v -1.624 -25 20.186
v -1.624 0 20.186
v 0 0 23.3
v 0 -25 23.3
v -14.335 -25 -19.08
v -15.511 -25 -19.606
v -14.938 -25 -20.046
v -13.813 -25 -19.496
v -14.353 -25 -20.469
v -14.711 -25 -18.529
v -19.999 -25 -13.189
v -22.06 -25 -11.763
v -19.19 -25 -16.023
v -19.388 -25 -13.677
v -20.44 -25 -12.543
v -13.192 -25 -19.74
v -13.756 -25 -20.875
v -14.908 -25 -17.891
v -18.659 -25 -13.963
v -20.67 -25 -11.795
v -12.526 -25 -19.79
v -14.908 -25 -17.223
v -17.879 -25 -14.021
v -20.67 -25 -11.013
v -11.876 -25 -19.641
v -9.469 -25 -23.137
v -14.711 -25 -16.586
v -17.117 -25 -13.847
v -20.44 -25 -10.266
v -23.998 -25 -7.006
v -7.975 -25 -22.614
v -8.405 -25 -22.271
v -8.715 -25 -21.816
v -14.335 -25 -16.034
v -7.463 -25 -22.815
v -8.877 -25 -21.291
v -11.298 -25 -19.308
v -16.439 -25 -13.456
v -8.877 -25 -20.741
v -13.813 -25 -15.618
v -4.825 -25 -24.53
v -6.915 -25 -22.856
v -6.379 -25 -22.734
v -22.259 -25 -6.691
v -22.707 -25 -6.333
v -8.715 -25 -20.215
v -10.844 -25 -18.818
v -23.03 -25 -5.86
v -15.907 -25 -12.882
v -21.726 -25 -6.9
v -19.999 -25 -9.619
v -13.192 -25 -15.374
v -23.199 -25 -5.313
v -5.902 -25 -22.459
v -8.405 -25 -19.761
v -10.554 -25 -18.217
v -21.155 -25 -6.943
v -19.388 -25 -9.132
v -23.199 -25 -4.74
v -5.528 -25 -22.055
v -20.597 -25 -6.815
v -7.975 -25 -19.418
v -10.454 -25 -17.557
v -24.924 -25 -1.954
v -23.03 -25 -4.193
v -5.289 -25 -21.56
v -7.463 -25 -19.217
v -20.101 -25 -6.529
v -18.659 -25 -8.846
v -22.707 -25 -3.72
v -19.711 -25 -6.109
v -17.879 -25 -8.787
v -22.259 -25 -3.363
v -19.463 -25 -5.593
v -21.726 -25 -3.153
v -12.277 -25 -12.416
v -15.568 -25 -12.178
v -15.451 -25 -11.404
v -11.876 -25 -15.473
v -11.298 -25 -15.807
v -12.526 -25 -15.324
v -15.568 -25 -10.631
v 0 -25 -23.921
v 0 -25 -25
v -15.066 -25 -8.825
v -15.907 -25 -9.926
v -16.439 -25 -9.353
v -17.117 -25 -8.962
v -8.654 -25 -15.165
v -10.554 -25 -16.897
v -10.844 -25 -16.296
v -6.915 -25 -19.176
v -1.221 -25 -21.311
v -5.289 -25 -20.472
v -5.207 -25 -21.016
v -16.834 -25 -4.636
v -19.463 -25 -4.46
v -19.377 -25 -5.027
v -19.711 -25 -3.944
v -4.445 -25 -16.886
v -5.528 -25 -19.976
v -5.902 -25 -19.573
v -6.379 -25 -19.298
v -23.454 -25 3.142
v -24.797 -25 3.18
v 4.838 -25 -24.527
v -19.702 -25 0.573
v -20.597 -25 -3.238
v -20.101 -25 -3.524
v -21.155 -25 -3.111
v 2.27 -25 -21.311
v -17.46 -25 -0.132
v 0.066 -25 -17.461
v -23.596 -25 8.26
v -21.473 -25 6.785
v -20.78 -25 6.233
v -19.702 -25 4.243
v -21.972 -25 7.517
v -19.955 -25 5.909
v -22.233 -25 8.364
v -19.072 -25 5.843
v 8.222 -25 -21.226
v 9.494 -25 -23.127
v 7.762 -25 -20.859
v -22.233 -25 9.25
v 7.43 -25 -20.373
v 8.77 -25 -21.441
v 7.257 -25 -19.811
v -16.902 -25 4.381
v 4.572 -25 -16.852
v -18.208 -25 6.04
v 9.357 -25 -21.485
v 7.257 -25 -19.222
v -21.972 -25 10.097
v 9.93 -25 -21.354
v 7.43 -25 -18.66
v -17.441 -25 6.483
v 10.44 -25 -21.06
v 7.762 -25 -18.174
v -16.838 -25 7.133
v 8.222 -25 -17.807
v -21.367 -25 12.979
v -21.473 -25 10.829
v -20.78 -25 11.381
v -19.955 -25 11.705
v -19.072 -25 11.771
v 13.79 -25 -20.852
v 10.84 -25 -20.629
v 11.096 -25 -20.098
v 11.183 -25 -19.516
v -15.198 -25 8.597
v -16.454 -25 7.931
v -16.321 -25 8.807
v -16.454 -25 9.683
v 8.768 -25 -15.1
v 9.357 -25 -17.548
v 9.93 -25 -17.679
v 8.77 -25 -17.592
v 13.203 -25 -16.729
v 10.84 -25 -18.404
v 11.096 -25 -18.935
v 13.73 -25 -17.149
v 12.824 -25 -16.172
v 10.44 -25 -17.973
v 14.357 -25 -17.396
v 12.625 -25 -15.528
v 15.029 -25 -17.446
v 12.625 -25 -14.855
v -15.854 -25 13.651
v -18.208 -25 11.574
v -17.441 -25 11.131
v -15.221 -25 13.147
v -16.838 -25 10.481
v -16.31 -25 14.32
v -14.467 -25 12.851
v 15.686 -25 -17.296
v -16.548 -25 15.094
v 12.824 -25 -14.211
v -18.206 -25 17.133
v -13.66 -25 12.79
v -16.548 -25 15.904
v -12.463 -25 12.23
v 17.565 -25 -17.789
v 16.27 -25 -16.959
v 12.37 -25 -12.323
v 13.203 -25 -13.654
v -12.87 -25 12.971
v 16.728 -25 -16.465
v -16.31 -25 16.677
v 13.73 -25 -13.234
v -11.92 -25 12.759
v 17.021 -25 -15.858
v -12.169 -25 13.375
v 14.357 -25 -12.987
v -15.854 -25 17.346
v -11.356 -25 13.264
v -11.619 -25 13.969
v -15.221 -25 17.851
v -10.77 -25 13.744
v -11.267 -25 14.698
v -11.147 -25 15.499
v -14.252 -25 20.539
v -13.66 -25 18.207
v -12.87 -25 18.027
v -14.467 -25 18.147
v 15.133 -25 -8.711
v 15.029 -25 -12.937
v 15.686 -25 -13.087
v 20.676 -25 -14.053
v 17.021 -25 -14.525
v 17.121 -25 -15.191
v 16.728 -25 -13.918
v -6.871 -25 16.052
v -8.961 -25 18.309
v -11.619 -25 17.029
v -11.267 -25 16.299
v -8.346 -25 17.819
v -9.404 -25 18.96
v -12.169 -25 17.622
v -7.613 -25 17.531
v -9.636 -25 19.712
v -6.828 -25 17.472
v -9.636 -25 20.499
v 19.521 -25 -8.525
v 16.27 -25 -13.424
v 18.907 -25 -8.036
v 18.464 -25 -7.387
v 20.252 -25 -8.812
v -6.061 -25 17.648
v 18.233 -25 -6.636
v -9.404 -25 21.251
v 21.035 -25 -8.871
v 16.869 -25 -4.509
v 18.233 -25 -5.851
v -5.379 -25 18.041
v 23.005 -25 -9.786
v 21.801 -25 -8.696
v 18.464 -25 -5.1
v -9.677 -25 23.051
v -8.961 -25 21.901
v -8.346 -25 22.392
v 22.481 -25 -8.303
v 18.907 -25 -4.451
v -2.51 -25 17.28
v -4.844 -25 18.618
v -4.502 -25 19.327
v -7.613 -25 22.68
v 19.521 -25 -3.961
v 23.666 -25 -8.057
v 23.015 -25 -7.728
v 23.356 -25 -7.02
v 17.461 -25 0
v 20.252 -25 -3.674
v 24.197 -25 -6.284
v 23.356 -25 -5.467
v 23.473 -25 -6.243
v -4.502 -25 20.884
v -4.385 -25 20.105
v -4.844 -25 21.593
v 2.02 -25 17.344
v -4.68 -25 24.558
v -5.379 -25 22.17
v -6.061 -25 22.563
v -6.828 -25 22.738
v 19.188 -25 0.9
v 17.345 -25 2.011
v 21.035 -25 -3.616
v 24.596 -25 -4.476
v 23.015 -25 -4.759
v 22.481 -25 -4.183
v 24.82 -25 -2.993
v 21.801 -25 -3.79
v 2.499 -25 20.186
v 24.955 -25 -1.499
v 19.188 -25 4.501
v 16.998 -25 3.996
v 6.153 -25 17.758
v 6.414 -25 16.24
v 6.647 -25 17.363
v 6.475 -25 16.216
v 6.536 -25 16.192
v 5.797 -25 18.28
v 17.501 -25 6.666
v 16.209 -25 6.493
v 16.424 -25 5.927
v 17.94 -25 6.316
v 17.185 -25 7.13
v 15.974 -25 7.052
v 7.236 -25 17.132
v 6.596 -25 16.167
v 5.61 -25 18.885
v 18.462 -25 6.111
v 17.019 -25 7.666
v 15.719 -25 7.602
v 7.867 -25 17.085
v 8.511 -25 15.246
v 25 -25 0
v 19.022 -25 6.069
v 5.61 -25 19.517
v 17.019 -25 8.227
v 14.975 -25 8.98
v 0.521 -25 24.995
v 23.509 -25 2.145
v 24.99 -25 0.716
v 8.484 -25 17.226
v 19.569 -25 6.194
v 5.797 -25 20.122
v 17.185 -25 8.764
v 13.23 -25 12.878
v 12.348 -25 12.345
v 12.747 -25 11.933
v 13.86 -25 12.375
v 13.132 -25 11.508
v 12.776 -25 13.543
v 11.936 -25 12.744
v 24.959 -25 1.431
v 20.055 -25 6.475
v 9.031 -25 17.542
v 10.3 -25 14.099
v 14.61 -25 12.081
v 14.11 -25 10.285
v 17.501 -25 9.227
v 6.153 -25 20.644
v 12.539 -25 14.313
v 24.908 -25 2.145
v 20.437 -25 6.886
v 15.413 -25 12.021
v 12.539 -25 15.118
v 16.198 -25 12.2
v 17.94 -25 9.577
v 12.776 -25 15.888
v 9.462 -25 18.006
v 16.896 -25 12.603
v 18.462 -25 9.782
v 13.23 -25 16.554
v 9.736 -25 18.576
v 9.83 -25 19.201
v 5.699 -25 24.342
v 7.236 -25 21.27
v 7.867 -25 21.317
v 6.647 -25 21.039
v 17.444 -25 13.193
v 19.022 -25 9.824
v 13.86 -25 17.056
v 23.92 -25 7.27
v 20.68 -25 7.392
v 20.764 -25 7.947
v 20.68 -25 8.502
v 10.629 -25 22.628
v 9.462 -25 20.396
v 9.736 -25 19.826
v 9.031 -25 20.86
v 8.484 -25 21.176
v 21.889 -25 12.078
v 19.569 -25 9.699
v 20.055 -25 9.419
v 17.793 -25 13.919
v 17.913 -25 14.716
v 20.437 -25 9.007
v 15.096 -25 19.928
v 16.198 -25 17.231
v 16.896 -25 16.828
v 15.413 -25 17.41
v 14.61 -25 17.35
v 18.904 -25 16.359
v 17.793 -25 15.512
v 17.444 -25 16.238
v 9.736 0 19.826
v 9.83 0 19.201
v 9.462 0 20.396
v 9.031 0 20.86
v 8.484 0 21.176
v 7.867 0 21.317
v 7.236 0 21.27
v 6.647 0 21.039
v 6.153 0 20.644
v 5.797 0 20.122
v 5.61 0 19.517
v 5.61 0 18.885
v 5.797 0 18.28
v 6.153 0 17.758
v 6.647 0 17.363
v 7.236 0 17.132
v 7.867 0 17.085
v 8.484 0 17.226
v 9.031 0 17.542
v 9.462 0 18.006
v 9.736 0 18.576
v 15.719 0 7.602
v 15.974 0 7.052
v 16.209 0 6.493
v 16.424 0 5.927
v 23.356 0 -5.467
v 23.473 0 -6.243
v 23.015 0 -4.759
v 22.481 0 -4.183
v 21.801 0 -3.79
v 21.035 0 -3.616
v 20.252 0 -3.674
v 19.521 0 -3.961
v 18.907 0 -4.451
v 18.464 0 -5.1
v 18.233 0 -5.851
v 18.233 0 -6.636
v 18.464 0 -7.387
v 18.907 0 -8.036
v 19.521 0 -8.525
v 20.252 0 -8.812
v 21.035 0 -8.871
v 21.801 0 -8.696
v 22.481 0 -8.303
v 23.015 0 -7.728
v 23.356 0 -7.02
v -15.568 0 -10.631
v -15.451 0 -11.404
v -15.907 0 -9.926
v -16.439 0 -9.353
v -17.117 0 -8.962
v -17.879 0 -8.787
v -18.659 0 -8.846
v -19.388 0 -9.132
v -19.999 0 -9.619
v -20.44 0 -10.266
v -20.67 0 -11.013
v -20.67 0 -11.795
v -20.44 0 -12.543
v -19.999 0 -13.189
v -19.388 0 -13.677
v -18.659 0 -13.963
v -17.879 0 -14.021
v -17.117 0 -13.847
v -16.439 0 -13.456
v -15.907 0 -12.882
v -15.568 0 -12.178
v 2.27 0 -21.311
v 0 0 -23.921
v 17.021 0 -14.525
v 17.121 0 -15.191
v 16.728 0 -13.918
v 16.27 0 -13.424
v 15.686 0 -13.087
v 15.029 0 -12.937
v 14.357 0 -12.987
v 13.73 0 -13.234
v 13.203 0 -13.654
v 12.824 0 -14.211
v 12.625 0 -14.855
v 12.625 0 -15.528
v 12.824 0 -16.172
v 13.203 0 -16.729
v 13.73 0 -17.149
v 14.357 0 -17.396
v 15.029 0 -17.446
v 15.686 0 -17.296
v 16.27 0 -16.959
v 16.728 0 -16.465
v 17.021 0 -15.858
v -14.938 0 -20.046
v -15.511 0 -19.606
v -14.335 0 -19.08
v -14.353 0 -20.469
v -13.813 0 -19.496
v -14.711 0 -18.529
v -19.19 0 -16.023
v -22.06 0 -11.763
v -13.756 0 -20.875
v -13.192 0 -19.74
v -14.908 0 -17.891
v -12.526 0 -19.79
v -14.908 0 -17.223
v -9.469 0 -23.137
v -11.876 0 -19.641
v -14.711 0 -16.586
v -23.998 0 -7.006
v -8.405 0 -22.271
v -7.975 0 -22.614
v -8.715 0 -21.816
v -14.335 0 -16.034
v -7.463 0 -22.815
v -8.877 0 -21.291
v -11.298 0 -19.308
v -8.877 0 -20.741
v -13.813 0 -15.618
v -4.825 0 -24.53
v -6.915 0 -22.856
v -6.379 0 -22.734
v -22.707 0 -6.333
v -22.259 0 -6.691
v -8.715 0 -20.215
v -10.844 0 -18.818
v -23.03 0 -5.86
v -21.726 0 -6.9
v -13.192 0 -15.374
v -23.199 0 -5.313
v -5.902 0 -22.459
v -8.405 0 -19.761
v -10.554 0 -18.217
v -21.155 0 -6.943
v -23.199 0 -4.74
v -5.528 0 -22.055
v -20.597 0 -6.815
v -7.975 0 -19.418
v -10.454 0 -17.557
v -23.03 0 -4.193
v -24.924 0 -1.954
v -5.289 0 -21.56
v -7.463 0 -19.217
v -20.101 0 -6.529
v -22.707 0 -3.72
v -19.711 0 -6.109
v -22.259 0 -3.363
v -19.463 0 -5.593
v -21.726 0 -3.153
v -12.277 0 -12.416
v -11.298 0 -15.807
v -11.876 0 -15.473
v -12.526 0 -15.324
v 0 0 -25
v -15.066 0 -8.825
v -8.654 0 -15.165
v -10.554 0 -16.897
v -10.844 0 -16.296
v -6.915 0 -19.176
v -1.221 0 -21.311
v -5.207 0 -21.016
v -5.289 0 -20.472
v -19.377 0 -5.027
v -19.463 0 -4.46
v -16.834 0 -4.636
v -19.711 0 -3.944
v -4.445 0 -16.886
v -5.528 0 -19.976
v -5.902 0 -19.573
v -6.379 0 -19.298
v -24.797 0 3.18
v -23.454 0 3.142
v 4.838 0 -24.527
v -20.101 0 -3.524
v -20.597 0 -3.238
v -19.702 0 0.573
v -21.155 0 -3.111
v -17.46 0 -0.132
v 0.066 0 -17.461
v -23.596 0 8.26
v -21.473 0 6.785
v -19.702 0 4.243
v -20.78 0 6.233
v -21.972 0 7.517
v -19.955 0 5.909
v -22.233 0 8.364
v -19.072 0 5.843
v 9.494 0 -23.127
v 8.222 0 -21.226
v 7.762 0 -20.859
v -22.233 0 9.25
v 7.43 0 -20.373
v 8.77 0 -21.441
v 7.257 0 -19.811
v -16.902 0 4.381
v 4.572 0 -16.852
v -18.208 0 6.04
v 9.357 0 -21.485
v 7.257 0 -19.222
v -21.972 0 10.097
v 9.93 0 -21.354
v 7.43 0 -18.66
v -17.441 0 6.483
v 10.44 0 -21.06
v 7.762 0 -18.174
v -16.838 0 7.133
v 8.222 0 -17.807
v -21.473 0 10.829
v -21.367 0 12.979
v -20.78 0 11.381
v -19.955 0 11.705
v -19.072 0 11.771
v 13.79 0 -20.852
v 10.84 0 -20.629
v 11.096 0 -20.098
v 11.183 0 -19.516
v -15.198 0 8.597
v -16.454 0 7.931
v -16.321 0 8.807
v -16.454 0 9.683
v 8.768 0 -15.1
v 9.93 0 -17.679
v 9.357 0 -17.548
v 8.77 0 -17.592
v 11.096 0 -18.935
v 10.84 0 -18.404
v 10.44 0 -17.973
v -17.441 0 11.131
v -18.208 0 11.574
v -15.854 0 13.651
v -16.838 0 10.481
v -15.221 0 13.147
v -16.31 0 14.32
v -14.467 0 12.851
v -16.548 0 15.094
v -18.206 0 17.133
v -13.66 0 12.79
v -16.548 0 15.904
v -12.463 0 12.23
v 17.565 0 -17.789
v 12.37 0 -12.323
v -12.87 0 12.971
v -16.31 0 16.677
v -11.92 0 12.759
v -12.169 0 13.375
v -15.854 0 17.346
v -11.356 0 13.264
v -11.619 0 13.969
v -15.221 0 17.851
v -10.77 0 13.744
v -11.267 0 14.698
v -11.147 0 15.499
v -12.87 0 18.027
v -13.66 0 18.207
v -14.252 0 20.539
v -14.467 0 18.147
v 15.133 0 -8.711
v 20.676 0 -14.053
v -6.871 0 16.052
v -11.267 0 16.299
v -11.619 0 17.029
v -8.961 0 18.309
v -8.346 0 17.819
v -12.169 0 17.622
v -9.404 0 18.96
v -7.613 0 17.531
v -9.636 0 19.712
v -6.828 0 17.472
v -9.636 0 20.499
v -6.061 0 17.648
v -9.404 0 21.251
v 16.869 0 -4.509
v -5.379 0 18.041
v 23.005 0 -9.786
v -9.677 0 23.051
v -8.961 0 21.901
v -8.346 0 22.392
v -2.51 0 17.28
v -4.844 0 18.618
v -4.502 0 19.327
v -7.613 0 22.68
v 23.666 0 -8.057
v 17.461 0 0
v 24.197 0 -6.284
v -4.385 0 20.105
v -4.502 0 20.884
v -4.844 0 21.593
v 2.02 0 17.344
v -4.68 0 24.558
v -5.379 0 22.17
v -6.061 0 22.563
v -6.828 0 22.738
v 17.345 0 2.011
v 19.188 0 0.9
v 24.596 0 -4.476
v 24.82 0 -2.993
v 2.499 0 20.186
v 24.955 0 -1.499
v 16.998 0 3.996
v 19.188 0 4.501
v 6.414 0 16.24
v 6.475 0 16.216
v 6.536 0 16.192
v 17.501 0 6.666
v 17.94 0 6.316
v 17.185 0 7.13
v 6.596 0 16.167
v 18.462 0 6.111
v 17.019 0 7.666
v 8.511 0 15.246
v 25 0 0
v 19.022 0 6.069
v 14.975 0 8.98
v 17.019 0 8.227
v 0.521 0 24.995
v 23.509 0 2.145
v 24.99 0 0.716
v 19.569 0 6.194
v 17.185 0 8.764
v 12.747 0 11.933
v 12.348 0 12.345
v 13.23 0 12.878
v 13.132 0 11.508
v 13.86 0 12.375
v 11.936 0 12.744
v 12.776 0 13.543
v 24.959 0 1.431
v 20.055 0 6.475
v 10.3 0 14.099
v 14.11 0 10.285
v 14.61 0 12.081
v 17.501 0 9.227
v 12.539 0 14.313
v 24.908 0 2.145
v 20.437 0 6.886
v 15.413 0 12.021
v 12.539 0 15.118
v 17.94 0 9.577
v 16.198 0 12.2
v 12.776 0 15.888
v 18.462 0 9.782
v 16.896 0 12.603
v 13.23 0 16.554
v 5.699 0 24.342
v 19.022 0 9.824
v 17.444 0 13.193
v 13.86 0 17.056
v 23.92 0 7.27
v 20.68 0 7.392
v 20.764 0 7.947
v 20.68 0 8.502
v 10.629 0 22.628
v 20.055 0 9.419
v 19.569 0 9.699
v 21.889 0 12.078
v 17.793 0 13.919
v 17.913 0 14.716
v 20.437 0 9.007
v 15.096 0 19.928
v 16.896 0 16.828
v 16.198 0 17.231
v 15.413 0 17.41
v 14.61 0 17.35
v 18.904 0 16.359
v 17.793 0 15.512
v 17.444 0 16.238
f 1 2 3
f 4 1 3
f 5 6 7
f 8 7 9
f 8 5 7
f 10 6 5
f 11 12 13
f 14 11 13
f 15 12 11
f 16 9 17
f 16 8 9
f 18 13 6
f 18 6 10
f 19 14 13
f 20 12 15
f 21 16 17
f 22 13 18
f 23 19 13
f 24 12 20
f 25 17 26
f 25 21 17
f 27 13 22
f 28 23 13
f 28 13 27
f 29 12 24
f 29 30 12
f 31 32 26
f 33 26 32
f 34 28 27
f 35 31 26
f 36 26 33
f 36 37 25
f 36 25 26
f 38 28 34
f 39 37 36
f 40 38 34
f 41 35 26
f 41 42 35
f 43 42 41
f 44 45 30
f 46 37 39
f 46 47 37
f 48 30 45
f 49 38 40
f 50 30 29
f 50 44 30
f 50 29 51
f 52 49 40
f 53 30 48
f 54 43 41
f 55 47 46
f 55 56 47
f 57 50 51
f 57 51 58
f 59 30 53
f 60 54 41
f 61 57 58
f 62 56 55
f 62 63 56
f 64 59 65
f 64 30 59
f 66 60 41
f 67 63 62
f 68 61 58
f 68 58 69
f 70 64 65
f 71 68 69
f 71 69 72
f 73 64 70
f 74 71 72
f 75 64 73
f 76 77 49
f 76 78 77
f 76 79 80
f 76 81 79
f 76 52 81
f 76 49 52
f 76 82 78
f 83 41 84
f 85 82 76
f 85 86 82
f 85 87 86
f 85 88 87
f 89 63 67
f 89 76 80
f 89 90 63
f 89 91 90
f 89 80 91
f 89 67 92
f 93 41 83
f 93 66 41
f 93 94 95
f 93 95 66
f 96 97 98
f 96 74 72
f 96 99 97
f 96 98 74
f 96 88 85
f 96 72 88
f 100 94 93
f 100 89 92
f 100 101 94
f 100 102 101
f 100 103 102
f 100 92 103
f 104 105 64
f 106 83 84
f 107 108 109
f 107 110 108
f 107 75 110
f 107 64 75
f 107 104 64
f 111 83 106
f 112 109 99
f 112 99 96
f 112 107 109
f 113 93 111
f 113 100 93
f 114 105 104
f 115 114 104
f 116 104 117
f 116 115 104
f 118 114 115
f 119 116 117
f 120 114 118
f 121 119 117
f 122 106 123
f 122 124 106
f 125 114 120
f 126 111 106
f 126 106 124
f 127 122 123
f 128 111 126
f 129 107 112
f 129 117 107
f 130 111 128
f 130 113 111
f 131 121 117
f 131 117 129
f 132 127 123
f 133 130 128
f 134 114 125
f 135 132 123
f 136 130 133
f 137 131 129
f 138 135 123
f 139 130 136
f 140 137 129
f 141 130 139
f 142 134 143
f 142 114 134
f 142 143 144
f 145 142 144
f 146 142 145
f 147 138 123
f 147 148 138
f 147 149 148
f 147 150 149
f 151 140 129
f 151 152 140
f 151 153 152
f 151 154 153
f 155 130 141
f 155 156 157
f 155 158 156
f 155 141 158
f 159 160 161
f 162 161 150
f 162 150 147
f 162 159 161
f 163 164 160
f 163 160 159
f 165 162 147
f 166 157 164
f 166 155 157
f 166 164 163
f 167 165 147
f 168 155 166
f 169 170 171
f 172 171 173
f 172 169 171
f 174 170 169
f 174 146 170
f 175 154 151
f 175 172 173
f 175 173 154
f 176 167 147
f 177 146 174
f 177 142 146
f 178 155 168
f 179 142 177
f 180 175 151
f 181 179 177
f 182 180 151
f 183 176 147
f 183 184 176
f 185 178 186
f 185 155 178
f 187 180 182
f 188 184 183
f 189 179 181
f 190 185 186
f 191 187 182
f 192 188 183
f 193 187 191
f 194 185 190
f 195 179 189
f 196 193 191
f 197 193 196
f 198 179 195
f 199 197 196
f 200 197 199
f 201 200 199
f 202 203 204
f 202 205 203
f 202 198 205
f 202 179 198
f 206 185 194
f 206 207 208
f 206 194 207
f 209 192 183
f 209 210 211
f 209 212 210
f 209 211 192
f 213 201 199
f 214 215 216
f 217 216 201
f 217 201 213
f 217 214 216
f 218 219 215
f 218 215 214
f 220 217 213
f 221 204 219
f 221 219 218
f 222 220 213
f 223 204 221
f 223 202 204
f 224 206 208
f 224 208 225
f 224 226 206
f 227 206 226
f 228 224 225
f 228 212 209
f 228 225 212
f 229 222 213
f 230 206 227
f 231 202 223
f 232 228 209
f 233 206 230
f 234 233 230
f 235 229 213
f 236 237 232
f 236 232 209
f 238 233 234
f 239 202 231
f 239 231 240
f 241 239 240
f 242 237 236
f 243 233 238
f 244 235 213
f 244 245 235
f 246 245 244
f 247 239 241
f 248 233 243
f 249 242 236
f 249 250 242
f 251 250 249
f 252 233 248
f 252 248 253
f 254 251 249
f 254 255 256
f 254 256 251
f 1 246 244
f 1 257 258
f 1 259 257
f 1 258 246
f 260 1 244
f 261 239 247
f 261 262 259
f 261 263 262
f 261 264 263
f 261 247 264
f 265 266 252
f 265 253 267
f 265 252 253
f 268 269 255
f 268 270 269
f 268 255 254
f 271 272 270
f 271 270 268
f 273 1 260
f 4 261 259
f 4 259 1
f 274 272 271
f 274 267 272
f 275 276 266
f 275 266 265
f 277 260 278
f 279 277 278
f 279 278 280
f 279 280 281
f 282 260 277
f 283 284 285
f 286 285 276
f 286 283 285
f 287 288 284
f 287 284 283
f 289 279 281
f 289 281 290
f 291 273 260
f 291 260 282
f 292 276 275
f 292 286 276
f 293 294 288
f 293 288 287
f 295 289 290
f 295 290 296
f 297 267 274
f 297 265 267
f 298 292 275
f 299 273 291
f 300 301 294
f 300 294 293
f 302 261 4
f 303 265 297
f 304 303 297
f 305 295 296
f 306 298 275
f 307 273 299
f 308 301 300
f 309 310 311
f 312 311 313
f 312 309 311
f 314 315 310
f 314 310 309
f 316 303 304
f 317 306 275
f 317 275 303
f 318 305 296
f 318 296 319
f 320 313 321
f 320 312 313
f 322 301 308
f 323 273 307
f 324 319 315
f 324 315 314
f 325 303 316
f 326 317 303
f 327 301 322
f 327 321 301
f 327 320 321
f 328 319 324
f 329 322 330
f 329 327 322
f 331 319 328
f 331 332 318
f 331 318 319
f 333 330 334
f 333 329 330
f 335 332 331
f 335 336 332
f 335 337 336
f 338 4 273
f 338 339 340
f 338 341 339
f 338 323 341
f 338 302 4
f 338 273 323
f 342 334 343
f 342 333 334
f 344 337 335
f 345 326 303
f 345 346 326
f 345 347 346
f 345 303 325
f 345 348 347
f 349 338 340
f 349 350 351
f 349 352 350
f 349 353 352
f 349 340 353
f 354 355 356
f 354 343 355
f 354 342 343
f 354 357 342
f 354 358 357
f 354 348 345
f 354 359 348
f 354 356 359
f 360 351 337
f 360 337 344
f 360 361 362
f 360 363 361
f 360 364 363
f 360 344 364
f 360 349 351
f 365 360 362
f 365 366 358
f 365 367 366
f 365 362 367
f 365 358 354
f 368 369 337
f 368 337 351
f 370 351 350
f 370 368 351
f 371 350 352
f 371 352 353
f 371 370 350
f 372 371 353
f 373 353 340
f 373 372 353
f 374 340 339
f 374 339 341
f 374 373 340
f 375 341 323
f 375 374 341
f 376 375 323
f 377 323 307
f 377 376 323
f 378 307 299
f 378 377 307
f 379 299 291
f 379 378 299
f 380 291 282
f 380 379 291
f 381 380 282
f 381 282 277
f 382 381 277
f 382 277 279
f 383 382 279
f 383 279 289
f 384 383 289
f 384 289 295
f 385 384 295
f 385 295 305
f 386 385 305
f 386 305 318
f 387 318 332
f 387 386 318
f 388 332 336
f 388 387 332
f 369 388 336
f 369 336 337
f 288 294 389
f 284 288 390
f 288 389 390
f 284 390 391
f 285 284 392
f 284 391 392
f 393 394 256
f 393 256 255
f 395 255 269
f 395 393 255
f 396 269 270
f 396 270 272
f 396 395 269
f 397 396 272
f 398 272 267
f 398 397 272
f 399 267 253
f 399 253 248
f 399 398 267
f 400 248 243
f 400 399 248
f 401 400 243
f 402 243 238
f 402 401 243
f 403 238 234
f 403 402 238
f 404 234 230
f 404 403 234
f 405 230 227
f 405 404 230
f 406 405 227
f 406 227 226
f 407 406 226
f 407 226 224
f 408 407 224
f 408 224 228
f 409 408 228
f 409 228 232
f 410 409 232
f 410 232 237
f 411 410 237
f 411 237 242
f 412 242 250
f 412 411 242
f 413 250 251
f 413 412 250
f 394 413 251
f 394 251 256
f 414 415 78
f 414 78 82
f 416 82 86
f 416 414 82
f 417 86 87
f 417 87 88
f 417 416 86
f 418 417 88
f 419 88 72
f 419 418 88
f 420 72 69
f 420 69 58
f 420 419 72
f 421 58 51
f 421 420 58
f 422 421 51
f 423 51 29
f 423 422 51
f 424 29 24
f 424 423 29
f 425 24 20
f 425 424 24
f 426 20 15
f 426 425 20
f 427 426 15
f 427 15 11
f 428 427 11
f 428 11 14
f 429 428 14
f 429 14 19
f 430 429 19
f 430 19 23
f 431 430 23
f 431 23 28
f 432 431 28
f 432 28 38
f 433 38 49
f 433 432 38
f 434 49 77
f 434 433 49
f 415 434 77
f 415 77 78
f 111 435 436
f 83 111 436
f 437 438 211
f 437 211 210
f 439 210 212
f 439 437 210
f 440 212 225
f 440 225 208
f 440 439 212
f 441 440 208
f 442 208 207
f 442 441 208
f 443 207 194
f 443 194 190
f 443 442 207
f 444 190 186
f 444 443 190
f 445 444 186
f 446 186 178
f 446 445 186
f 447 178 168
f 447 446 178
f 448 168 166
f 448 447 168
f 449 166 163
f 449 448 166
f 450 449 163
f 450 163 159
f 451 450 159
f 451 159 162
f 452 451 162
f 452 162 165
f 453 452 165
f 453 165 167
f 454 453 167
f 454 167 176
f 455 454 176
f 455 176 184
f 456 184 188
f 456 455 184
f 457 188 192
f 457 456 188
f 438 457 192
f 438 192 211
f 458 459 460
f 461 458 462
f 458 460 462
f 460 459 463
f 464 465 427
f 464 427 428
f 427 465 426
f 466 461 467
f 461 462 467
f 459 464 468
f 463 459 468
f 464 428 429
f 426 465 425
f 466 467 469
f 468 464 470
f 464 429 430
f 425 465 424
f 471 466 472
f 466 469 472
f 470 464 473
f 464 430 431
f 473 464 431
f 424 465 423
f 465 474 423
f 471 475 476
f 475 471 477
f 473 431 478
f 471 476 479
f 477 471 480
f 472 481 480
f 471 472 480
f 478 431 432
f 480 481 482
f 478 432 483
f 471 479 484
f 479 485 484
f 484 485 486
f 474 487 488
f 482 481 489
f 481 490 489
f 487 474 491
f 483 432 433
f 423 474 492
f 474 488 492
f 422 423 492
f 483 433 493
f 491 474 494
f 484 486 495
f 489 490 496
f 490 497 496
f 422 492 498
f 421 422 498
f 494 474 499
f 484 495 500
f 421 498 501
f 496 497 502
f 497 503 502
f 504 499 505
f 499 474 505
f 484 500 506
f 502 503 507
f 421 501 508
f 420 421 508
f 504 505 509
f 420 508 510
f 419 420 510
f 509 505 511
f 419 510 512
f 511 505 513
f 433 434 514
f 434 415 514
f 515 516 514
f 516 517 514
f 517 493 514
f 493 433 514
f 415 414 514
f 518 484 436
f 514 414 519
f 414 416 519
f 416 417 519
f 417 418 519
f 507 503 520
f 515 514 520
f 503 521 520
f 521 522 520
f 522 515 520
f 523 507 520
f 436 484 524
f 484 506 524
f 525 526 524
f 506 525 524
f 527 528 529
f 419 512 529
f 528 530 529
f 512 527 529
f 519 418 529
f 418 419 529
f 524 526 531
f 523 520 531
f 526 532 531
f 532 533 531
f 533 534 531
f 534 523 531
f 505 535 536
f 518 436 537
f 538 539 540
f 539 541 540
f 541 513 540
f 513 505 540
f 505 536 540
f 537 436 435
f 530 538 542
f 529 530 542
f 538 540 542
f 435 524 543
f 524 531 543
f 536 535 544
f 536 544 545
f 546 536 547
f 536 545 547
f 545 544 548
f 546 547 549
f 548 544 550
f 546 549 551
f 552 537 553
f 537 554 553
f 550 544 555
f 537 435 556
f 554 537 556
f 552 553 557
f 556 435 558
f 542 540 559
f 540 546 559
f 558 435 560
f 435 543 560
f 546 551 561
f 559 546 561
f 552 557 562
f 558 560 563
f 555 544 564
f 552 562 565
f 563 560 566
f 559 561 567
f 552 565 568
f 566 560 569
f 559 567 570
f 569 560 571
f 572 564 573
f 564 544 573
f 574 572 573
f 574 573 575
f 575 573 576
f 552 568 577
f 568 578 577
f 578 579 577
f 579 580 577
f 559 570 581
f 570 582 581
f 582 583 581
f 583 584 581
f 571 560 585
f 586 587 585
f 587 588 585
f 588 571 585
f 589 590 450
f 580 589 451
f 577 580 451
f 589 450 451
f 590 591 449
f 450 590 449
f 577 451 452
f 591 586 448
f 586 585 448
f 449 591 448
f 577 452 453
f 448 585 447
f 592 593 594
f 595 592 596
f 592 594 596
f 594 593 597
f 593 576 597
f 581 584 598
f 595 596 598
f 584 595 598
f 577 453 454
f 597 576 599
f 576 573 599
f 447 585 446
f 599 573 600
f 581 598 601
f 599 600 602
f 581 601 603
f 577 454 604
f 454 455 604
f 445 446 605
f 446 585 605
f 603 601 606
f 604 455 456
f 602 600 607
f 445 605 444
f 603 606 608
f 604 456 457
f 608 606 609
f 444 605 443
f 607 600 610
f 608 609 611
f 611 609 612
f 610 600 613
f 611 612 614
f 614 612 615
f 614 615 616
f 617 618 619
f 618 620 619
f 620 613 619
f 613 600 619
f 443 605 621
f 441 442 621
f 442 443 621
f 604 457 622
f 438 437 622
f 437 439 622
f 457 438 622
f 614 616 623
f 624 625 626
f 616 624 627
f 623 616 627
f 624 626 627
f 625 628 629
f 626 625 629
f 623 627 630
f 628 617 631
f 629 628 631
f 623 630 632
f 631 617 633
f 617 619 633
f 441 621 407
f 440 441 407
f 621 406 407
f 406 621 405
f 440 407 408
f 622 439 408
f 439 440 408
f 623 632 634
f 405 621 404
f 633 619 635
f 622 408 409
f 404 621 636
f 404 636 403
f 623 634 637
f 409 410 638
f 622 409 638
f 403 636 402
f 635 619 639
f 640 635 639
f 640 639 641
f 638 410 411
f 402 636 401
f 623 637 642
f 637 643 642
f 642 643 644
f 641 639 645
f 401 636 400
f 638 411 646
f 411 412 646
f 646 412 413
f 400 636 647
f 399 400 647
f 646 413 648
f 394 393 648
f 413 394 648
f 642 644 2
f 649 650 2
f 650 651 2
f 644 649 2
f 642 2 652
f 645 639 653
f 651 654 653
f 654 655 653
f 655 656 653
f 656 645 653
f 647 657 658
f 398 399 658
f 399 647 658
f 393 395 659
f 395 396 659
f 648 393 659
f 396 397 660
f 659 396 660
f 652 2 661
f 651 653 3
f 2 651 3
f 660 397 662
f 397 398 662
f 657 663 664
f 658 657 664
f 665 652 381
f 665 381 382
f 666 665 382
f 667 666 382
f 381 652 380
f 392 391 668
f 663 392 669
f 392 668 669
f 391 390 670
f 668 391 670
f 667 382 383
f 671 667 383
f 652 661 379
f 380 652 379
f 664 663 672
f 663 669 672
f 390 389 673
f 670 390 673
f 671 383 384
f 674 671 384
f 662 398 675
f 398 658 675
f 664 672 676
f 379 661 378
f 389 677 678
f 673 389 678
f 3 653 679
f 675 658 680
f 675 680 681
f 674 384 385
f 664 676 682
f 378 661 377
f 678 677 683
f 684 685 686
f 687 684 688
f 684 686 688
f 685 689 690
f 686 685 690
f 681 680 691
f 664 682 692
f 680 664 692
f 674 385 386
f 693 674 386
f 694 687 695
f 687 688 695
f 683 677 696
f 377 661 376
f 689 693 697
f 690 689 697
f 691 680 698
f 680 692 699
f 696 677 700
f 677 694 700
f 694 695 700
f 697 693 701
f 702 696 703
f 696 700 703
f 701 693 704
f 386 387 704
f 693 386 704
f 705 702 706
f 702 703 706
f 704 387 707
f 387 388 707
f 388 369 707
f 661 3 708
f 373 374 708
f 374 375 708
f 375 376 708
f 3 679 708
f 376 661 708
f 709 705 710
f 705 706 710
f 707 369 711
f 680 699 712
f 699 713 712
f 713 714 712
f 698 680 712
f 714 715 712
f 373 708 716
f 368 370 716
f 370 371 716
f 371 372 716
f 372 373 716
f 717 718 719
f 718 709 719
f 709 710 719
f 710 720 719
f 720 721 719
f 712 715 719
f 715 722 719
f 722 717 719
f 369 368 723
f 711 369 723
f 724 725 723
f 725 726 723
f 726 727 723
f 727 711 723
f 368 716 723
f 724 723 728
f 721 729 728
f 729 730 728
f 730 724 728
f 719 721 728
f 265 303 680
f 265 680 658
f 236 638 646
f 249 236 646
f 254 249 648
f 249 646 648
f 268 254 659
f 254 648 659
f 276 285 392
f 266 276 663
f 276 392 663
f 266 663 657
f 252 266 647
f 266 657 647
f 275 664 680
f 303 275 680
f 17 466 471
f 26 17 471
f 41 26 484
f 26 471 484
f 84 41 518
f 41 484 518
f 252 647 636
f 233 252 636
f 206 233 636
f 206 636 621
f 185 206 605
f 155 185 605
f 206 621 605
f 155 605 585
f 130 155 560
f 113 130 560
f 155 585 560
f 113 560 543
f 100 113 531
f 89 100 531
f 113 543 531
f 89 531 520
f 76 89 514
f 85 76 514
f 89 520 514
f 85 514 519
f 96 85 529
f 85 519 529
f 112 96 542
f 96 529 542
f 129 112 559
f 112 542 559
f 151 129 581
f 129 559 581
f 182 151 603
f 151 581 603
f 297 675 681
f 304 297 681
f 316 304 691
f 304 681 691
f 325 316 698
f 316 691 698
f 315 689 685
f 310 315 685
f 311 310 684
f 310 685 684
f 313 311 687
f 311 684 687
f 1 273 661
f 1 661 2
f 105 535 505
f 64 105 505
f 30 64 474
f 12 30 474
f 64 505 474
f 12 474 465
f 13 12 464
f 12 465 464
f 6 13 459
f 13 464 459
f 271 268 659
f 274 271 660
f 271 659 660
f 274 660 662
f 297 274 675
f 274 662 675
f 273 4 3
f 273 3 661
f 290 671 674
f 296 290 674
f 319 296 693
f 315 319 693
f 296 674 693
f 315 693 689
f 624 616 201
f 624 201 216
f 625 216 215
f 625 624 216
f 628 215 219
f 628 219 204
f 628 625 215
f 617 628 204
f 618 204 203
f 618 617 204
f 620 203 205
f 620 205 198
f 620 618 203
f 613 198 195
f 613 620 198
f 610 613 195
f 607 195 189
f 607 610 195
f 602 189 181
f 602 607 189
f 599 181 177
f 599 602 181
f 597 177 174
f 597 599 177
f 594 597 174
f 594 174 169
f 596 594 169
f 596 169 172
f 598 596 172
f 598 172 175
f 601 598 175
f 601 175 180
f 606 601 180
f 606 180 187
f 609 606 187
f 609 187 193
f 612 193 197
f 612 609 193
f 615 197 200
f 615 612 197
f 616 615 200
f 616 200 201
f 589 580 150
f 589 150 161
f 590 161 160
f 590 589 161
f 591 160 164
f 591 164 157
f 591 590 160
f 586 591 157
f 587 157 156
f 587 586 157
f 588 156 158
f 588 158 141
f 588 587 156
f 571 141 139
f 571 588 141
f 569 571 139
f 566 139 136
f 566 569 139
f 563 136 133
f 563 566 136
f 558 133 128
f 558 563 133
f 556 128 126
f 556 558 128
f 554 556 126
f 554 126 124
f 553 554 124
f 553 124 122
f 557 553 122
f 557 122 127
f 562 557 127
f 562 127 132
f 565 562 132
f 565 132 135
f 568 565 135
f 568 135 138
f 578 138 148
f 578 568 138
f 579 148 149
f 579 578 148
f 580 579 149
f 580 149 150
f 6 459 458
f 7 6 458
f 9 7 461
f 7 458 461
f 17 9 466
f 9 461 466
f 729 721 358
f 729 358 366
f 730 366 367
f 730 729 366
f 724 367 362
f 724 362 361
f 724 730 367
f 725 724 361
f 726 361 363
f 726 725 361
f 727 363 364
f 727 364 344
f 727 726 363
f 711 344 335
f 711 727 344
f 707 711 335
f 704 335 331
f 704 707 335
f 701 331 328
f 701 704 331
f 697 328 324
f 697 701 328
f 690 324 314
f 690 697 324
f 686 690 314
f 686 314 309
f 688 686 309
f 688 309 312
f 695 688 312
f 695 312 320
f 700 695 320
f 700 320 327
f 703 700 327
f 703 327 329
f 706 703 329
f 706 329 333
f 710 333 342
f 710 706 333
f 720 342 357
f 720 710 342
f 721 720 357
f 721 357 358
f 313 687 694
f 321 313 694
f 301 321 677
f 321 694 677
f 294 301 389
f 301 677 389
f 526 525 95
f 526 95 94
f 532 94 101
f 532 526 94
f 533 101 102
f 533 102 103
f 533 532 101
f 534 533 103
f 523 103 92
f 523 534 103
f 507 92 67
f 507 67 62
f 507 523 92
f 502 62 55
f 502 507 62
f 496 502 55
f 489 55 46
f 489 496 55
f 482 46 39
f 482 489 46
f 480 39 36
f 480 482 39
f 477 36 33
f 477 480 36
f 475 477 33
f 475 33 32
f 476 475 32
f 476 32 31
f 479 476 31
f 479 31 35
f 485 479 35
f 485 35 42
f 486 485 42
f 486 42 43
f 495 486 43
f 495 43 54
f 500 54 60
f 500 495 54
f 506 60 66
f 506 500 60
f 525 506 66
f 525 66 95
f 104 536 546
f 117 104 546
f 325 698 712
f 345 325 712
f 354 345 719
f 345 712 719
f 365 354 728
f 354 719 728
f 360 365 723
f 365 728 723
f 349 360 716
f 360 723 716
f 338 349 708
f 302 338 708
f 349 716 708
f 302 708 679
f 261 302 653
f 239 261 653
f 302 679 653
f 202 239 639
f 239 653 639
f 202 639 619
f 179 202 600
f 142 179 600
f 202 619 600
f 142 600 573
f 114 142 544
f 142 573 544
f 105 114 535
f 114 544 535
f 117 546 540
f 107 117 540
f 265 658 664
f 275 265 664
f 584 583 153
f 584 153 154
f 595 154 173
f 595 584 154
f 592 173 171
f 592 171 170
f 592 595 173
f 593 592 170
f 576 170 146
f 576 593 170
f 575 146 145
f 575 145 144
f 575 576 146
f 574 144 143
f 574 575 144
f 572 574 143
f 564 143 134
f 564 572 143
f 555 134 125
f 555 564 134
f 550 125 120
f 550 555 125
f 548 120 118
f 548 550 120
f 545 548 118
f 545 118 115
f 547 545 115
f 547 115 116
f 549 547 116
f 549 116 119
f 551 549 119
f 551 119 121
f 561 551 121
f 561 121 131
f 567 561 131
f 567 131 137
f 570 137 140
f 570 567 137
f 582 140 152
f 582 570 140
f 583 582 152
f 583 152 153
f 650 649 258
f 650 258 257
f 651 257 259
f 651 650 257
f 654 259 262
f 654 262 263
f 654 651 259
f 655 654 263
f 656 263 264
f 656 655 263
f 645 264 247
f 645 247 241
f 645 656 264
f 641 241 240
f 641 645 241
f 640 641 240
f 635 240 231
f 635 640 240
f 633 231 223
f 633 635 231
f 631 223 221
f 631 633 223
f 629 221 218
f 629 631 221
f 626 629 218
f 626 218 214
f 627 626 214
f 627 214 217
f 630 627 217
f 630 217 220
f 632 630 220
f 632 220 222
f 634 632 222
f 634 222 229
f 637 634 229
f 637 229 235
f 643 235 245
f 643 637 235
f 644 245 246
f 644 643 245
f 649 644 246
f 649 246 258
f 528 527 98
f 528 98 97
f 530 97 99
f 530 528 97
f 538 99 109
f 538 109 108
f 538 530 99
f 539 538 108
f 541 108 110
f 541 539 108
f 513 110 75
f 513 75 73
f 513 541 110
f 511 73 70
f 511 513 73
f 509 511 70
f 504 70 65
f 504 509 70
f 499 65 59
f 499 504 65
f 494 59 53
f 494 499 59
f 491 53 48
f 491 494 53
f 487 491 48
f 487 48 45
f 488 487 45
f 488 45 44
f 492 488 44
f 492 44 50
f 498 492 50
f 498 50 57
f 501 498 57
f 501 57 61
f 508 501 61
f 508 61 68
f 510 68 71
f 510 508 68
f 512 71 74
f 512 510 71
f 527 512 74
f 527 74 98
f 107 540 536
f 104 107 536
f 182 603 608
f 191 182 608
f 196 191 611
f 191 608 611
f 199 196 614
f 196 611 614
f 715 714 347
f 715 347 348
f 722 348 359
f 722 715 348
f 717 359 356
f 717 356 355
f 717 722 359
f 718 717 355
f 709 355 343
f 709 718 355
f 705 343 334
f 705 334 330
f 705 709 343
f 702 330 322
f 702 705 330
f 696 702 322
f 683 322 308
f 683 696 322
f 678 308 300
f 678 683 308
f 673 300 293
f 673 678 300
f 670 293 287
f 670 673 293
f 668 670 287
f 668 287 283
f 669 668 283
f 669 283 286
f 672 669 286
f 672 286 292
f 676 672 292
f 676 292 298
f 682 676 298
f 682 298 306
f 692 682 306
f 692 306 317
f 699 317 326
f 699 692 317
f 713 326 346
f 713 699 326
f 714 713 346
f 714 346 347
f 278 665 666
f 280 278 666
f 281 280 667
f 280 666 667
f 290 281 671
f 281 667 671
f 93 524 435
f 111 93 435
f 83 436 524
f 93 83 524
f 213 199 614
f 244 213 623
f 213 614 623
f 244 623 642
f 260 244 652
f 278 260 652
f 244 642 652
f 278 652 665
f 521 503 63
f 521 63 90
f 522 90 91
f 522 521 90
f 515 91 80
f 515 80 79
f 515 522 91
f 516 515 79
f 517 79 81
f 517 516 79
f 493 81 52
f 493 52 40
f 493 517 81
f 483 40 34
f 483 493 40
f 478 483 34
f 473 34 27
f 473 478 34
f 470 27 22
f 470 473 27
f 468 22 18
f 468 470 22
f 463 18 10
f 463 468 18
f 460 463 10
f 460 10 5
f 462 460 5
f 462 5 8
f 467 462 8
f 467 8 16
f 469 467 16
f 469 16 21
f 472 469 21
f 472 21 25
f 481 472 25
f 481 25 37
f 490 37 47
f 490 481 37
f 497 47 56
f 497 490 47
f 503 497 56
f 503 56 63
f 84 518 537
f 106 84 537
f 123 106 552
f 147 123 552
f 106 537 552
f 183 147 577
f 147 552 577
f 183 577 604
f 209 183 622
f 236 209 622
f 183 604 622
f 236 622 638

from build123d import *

# Parameters (mm, degrees)
F0_R     = 2.8256485239
F0_R_2   = 3.5765465122
F0_R_3   = 2.7439429232
F0_R_4   = 3.3466336439
F0_R_5   = 3.4276298102
F0_R_6   = 3.6294104123
F0_R_7   = 2.635041669
F0_R_8   = 2.702327646
F0_R_9   = 2.972249944
F0_R_10  = 2.6404432644
F0_R_11  = 2.6241403427
F0_R_12  = 2.7159497561
F0_R_13  = 2.2390207397
F0_R_14  = 2.2607819858
F0_R_15  = 1.9741758504
F0_R_16  = 2.1219308593
F0_R_17  = 1.8827842167
F0_R_18  = 1.845321618
F0_R_19  = 1.9213841029
F1_DEPTH = 25


with BuildPart() as f1:
    # F0 (on Front) → F1 (new body)
    with BuildSketch(Plane.XZ):
        with BuildLine():
            ThreePointArc((24.5960952758, -4.4757230907), (24.8988190673, -2.2469555075), (25, 0))
            ThreePointArc((25, 0), (24.9769503507, 1.073289886), (24.9078439057, 2.1446006555))
            ThreePointArc((24.9078439057, 2.1446006555), (0.5208838947, 24.9945730103), (-24.7968706797, 3.1804409279))
            ThreePointArc((-24.7968706797, 3.1804409279), (-23.1514874221, -9.4344385176), (-15.5110739298, -19.6062894384))
            ThreePointArc((-15.5110739298, -19.6062894384), (-13.7709472228, -14.2438804489), (-9.2095510788, -17.5570566207))
            ThreePointArc((-9.2095510788, -17.5570566207), (-10.6398306506, -20.3713740635), (-13.7563172666, -20.8749547368))
            ThreePointArc((-13.7563172666, -20.8749547368), (-7.1807427047, -23.9465432622), (0, -25))
            ThreePointArc((0, -25), (13.7903970721, -20.8524566561), (23.0050925772, -9.7859958876))
            ThreePointArc((23.0050925772, -9.7859958876), (16.860220208, -5.0514647504), (24.5960952758, -4.4757230907))
        make_face()
        with Locations((-7.0527321659, -21.0157949477)):
            Circle(F0_R, mode=Mode.SUBTRACT)
        with Locations((-18.0755164474, -11.404263787)):
            Circle(F0_R_2, mode=Mode.SUBTRACT)
        with Locations((-21.2986432016, -5.0265877508)):
            Circle(F0_R_3, mode=Mode.SUBTRACT)
        Polygon((4.266737029, -20.0934484601), (0, -25), (-2.6190390345, -20.0934484601), align=None, mode=Mode.SUBTRACT)
        with Locations((9.209163487, -19.5164699107)):
            Circle(F0_R_4, mode=Mode.SUBTRACT)
        with Locations((14.8604605347, -15.1914991438)):
            Circle(F0_R_5, mode=Mode.SUBTRACT)
        with BuildLine():
            Line((-18.9121421427, -0.7938772906), (-24.7968706797, 3.1804409279))
            Line((-24.7968706797, 3.1804409279), (-19.3468905014, 5.0684465431))
            ThreePointArc((-19.3468905014, 5.0684465431), (-21.9186154294, 11.469459375), (-15.5548330751, 8.8069401681))
            ThreePointArc((-15.5548330751, 8.8069401681), (-16.5182971087, 6.3016908172), (-18.9121421427, 5.0875890061))
            Line((-18.9121421427, 5.0875890061), (-18.9121421427, -0.7938772906))
        make_face(mode=Mode.SUBTRACT)
        with Locations((-7.0253848098, 20.105432719)):
            Circle(F0_R_6, mode=Mode.SUBTRACT)
        with BuildLine():
            Line((19.5046194307, 4.8279847044), (24.9078439057, 2.1446006555))
            Line((24.9078439057, 2.1446006555), (18.717167899, 0))
            Line((18.717167899, 0), (18.717167899, 4.7704775792))
            ThreePointArc((18.717167899, 4.7704775792), (17.4488389654, 5.1069570809), (16.4242905584, 5.9268212774))
            ThreePointArc((16.4242905584, 5.9268212774), (17.1998275024, 3.0083990244), (17.4609430101, 0))
            ThreePointArc((17.4609430101, 0), (-6.6059492578, -16.1631050607), (-12.4625227562, 12.2298837833))
            ThreePointArc((-12.4625227562, 12.2298837833), (-16.8312529103, 17.4566617233), (-10.3065616702, 15.4987508431))
            ThreePointArc((-10.3065616702, 15.4987508431), (-10.4242678564, 14.5913936768), (-10.7695943307, 13.7441030538))
            ThreePointArc((-10.7695943307, 13.7441030538), (-2.5101792072, 17.2795697617), (6.4137999623, 16.2403109836))
            ThreePointArc((6.4137999623, 16.2403109836), (5.9393579148, 21.9051948536), (10.9397131516, 19.2010402679))
            ThreePointArc((10.9397131516, 19.2010402679), (9.558784183, 16.551960716), (6.5962795119, 16.1670537638))
            ThreePointArc((6.5962795119, 16.1670537638), (9.4231129686, 14.6999820674), (11.9364463054, 12.7438526513))
            ThreePointArc((11.9364463054, 12.7438526513), (14.1879258767, 18.3986934482), (19.0337079573, 14.7156538442))
            ThreePointArc((19.0337079573, 14.7156538442), (17.0365778867, 11.3571292026), (13.1320353046, 11.5080050208))
            ThreePointArc((13.1320353046, 11.5080050208), (14.5572332623, 9.6421725015), (15.7192265164, 7.6020029287))
            ThreePointArc((15.7192265164, 7.6020029287), (18.7083751896, 11.1226574982), (22.0615752041, 7.9468004405))
            ThreePointArc((22.0615752041, 7.9468004405), (21.3406257649, 5.9303038237), (19.5046194307, 4.8279847044))
        make_face(mode=Mode.SUBTRACT)
        Polygon((3.975788597, 19.6694843471), (-2.6190390345, 19.6694843471), (0, 24.2276750505), align=None, mode=Mode.SUBTRACT)
        with BuildLine():
            ThreePointArc((23.0050925772, -9.7859958876), (23.9482362722, -7.1750943862), (24.5960952758, -4.4757230907))
            ThreePointArc((24.5960952758, -4.4757230907), (16.860220208, -5.0514647504), (23.0050925772, -9.7859958876))
        make_face()
        with Locations((20.8382867277, -6.2433271669)):
            Circle(F0_R_7, mode=Mode.SUBTRACT)
        with BuildLine():
            ThreePointArc((11.9364463054, 12.7438526513), (12.5494630323, 12.1406551883), (13.1320353046, 11.5080050208))
            ThreePointArc((13.1320353046, 11.5080050208), (17.0365778867, 11.3571292026), (19.0337079573, 14.7156538442))
            ThreePointArc((19.0337079573, 14.7156538442), (14.1879258767, 18.3986934482), (11.9364463054, 12.7438526513))
        make_face()
        with Locations((15.2111686766, 14.7156538442)):
            Circle(F0_R_8, mode=Mode.SUBTRACT)
        with BuildLine():
            ThreePointArc((-15.5548330751, 8.8069401681), (-21.9186154294, 11.469459375), (-19.3468905014, 5.0684465431))
            Line((-19.3468905014, 5.0684465431), (-18.9121421427, 5.2190539427))
            Line((-18.9121421427, 5.2190539427), (-18.9121421427, 5.0875890061))
            ThreePointArc((-18.9121421427, 5.0875890061), (-16.5182971087, 6.3016908172), (-15.5548330751, 8.8069401681))
        make_face()
        with Locations((-19.2937050015, 8.8069401681)):
            Circle(F0_R_9, mode=Mode.SUBTRACT)
        with Locations((-7.0253848098, 20.105432719)):
            Circle(F0_R_6)
        with Locations((-7.0253848098, 20.105432719)):
            Circle(F0_R_10, mode=Mode.SUBTRACT)
        with Locations((-18.0755164474, -11.404263787)):
            Circle(F0_R_2)
        with Locations((-18.0755164474, -11.404263787)):
            Circle(F0_R_11, mode=Mode.SUBTRACT)
        with BuildLine():
            ThreePointArc((-10.3065616702, 15.4987508431), (-16.8312529103, 17.4566617233), (-12.4625227562, 12.2298837833))
            ThreePointArc((-12.4625227562, 12.2298837833), (-11.6407057812, 13.0145495395), (-10.7695943307, 13.7441030538))
            ThreePointArc((-10.7695943307, 13.7441030538), (-10.4242678564, 14.5913936768), (-10.3065616702, 15.4987508431))
        make_face()
        with Locations((-13.8626694679, 15.4987508431)):
            Circle(F0_R_12, mode=Mode.SUBTRACT)
        with BuildLine():
            ThreePointArc((-9.2095510788, -17.5570566207), (-13.7709472228, -14.2438804489), (-15.5110739298, -19.6062894384))
            ThreePointArc((-15.5110739298, -19.6062894384), (-14.6474374814, -20.2596291977), (-13.7563172666, -20.8749547368))
            ThreePointArc((-13.7563172666, -20.8749547368), (-10.6398306506, -20.3713740635), (-9.2095510788, -17.5570566207))
        make_face()
        with Locations((-12.6935141161, -17.5570566207)):
            Circle(F0_R_13, mode=Mode.SUBTRACT)
        with Locations((14.8604605347, -15.1914991438)):
            Circle(F0_R_5)
        with Locations((14.8604605347, -15.1914991438)):
            Circle(F0_R_14, mode=Mode.SUBTRACT)
        with Locations((9.209163487, -19.5164699107)):
            Circle(F0_R_4)
        with Locations((9.209163487, -19.5164699107)):
            Circle(F0_R_15, mode=Mode.SUBTRACT)
        with BuildLine():
            ThreePointArc((6.4137999623, 16.2403109836), (6.5051428606, 16.2039392484), (6.5962795119, 16.1670537638))
            ThreePointArc((6.5962795119, 16.1670537638), (9.558784183, 16.551960716), (10.9397131516, 19.2010402679))
            ThreePointArc((10.9397131516, 19.2010402679), (5.9393579148, 21.9051948536), (6.4137999623, 16.2403109836))
        make_face()
        with Locations((7.7083422802, 19.2010402679)):
            Circle(F0_R_16, mode=Mode.SUBTRACT)
        with BuildLine():
            Line((18.717167899, 5.2190539427), (19.5046194307, 4.8279847044))
            ThreePointArc((19.5046194307, 4.8279847044), (21.3406257649, 5.9303038237), (22.0615752041, 7.9468004405))
            ThreePointArc((22.0615752041, 7.9468004405), (18.7083751896, 11.1226574982), (15.7192265164, 7.6020029287))
            ThreePointArc((15.7192265164, 7.6020029287), (16.0935695505, 6.7735920991), (16.4242905584, 5.9268212774))
            ThreePointArc((16.4242905584, 5.9268212774), (17.4488389654, 5.1069570809), (18.717167899, 4.7704775792))
            Line((18.717167899, 4.7704775792), (18.717167899, 5.2190539427))
        make_face()
        with Locations((18.8810285181, 7.9468004405)):
            Circle(F0_R_17, mode=Mode.SUBTRACT)
        with Locations((-7.0527321659, -21.0157949477)):
            Circle(F0_R)
        with Locations((-7.0527321659, -21.0157949477)):
            Circle(F0_R_18, mode=Mode.SUBTRACT)
        with Locations((-21.2986432016, -5.0265877508)):
            Circle(F0_R_3)
        with Locations((-21.2986432016, -5.0265877508)):
            Circle(F0_R_19, mode=Mode.SUBTRACT)
        with BuildLine():
            Line((-19.3468905014, 5.0684465431), (-24.7968706797, 3.1804409279))
            Line((-24.7968706797, 3.1804409279), (-18.9121421427, -0.7938772906))
            Line((-18.9121421427, -0.7938772906), (-18.9121421427, 5.0875890061))
            ThreePointArc((-18.9121421427, 5.0875890061), (-19.1292375855, 5.0716873319), (-19.3468905014, 5.0684465431))
        make_face()
        Polygon((-19.7024215013, 4.2425552383), (-19.7024215013, 0.5726945819), (-23.453835398, 3.1415971462), align=None, mode=Mode.SUBTRACT)
        Polygon((-2.6190390345, -20.0934484601), (0, -25), (4.266737029, -20.0934484601), align=None)
        Polygon((0, -23.921410939), (-1.2212268775, -21.310839802), (2.2701525595, -21.310839802), align=None, mode=Mode.SUBTRACT)
        with BuildLine():
            Line((18.717167899, 0), (24.9078439057, 2.1446006555))
            Line((24.9078439057, 2.1446006555), (19.5046194307, 4.8279847044))
            ThreePointArc((19.5046194307, 4.8279847044), (19.1126850593, 4.774701377), (18.717167899, 4.7704775792))
            Line((18.717167899, 4.7704775792), (18.717167899, 0))
        make_face()
        Polygon((23.5085282475, 2.1446006555), (19.1881656647, 0.9002434672), (19.1881656647, 4.50054463), align=None, mode=Mode.SUBTRACT)
        Polygon((0, 24.2276750505), (-2.6190390345, 19.6694843471), (3.975788597, 19.6694843471), align=None)
        Polygon((2.4991026148, 20.1859623194), (-1.6240375116, 20.1859623194), (0, 23.2999436557), align=None, mode=Mode.SUBTRACT)
        with BuildLine():
            ThreePointArc((18.717167899, 4.7704775792), (19.1126850593, 4.774701377), (19.5046194307, 4.8279847044))
            Line((19.5046194307, 4.8279847044), (18.717167899, 5.2190539427))
            Line((18.717167899, 5.2190539427), (18.717167899, 4.7704775792))
        make_face()
        with BuildLine():
            Line((-18.9121421427, 5.2190539427), (-19.3468905014, 5.0684465431))
            ThreePointArc((-19.3468905014, 5.0684465431), (-19.1292375855, 5.0716873319), (-18.9121421427, 5.0875890061))
            Line((-18.9121421427, 5.0875890061), (-18.9121421427, 5.2190539427))
        make_face()
    extrude(amount=F1_DEPTH)


solid = f1.part
